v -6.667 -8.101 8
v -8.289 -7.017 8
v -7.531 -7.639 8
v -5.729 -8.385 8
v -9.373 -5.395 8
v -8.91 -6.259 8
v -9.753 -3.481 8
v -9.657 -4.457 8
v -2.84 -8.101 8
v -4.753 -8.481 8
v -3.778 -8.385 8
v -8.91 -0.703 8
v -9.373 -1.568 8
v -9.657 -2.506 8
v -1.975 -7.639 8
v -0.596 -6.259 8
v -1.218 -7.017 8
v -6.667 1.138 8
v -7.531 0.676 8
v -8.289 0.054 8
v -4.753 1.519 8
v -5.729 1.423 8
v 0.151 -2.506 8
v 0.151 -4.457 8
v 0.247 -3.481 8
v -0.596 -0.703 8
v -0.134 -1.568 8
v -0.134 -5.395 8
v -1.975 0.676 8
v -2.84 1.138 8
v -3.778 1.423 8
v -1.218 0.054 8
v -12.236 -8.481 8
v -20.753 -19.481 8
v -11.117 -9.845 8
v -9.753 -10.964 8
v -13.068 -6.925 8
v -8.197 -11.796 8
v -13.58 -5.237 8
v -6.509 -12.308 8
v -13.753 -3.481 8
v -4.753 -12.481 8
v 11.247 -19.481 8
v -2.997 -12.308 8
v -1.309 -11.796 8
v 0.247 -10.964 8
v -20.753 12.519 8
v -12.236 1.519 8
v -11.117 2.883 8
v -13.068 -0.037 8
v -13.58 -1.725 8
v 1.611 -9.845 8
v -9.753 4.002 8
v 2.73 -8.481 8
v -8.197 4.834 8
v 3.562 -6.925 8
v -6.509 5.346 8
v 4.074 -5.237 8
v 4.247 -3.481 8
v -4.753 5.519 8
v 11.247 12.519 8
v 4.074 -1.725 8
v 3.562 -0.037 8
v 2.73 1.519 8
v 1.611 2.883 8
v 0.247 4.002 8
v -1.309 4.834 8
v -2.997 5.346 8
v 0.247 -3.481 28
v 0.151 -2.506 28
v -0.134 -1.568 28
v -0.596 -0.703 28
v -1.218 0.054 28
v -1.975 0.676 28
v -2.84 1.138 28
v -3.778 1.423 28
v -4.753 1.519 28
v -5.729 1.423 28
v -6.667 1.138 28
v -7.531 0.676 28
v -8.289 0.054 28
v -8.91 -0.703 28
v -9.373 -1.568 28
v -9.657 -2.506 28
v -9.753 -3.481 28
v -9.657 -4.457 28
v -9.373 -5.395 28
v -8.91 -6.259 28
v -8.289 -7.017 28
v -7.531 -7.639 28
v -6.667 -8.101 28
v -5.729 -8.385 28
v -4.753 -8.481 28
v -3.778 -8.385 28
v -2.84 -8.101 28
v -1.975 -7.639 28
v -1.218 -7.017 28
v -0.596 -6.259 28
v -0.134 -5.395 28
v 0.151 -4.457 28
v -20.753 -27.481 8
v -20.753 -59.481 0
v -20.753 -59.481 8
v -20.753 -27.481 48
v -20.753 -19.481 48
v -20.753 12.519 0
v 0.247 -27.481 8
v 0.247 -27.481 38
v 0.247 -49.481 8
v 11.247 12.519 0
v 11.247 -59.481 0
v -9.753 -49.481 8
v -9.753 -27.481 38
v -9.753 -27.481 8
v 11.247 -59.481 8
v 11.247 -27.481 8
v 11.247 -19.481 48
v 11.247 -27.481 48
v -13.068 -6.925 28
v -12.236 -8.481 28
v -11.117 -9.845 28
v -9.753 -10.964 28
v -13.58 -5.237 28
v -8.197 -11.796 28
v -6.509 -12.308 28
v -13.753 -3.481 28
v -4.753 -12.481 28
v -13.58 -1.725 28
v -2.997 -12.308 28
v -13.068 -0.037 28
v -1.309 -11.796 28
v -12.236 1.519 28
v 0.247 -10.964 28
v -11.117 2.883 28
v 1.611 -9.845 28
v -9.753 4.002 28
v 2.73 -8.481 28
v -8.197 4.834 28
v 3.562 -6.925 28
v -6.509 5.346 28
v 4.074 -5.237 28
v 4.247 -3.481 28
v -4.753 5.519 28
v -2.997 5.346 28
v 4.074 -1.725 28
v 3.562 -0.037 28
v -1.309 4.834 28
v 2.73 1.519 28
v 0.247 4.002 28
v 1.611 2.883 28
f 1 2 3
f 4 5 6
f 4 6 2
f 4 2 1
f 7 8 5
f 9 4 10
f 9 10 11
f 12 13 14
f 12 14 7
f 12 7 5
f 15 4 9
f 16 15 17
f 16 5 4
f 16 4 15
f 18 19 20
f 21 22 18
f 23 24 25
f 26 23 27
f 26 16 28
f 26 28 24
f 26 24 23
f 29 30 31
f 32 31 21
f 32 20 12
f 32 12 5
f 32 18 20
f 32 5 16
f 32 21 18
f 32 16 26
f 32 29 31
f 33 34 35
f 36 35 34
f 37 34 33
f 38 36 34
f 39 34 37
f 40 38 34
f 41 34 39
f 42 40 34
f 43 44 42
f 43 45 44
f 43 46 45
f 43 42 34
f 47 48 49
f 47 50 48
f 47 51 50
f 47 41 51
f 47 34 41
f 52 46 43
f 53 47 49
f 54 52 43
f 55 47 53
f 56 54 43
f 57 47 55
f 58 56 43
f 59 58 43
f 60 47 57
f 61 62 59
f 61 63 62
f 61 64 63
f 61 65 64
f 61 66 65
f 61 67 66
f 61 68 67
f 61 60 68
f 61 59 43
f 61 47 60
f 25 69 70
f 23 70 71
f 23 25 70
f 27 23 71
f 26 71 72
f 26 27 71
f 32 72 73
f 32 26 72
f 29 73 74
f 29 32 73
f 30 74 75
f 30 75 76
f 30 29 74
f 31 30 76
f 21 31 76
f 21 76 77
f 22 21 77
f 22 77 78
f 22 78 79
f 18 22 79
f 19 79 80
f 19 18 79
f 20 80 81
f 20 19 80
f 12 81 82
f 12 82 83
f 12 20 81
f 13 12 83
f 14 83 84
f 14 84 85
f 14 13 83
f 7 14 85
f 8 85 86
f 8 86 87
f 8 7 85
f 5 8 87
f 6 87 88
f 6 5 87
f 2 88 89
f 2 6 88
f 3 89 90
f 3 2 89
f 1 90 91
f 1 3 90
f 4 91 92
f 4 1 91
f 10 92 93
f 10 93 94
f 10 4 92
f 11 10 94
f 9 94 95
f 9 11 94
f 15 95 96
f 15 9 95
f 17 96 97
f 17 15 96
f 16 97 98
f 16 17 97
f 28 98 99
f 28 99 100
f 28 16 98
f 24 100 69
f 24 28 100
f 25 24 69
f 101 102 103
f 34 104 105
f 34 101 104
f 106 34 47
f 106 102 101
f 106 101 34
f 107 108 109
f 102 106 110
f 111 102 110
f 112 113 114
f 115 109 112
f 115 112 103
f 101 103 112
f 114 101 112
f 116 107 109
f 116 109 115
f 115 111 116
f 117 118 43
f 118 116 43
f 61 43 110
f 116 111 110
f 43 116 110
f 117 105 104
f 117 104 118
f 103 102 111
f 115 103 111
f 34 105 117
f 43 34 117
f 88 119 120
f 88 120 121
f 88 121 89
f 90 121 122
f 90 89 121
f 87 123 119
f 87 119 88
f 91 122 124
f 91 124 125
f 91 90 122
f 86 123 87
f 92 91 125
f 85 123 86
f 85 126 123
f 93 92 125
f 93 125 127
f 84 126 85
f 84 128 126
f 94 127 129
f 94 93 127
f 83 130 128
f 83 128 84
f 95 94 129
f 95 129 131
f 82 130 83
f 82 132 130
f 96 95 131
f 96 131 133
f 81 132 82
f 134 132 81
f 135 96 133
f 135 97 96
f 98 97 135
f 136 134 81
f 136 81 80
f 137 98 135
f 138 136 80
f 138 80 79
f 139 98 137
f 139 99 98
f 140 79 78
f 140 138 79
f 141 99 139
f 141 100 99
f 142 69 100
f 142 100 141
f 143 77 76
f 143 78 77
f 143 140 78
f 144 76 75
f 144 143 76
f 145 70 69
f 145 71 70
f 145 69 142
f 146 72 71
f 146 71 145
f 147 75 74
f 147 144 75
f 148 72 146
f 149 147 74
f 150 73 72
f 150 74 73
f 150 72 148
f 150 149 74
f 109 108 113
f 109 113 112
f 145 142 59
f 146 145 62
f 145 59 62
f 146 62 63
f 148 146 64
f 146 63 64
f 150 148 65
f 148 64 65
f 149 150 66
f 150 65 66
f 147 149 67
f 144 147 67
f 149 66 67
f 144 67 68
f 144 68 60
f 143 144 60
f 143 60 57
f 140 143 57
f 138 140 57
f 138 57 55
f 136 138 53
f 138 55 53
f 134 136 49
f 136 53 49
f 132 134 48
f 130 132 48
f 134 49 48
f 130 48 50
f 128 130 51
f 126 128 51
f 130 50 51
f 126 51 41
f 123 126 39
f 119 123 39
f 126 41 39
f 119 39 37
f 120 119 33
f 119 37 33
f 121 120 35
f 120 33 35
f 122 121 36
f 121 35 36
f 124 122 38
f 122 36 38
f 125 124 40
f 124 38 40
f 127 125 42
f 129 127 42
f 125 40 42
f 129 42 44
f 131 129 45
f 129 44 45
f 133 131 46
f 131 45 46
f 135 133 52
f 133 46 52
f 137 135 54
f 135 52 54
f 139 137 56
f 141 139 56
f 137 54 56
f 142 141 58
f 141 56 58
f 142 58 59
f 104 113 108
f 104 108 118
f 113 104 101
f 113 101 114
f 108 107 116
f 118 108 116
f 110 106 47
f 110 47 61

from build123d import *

# Parameters (mm, degrees)
SKETCH2_W           = 32
SKETCH2_H           = 72
BOSS_EXTRUDE1_DEPTH = 8
SKETCH3_R           = 9
SKETCH3_R_2         = 5
SKETCH3_W           = 32
SKETCH3_H           = 8
BOSS_EXTRUDE2_DEPTH = 20
SKETCH4_W           = 32
SKETCH4_H           = 8
BOSS_EXTRUDE3_DEPTH = 20
RIB1_REACH          = 80.09
SKETCH5_WALL_W      = 195.381659614
SKETCH5_WALL_H      = 10


with BuildPart() as part:
    # Sketch2 → Boss-Extrude1 (new body)
    with BuildSketch(Plane.XY):
        with Locations((-4.753138075, -23.481171548)):
            Rectangle(SKETCH2_W, SKETCH2_H)
    extrude(amount=BOSS_EXTRUDE1_DEPTH)

    # Sketch3 → Boss-Extrude2 (add)
    # profile 1 of 2: a face of its own
    with BuildSketch(Plane.XY.offset(8)):
        with Locations((-4.753138075, -3.481171548)):
            Circle(SKETCH3_R)
        with Locations((-4.753138075, -3.481171548)):
            Circle(SKETCH3_R_2, mode=Mode.SUBTRACT)
    # profile 2 of 2: a face of its own
    with BuildSketch(Plane.XY.offset(8)):
        with Locations((-4.753138075, -23.481171548)):
            Rectangle(SKETCH3_W, SKETCH3_H)
    extrude(amount=BOSS_EXTRUDE2_DEPTH)

    # Sketch4 → Boss-Extrude3 (add)
    with BuildSketch(Plane.XY.offset(28)):
        with Locations((-4.753138075, -23.481171548)):
            Rectangle(SKETCH4_W, SKETCH4_H)
    extrude(amount=BOSS_EXTRUDE3_DEPTH)

    # Sketch5 wall → Rib1 (add, up to next)
    with BuildSketch(Plane(origin=(-4.753138075, -38.481171548, 23), x_dir=(0, -0.591363663628, -0.806404995856), z_dir=(0, -0.806404995856, 0.591363663628)), mode=Mode.PRIVATE) as rib1_sk1:
        Rectangle(SKETCH5_WALL_W, SKETCH5_WALL_H)
    rib1_tool1 = extrude(rib1_sk1.sketch, amount=-RIB1_REACH, mode=Mode.PRIVATE) - part.part
    add(rib1_tool1.solids().sort_by_distance((-4.753138075, -38.481171548, 23))[0])


solid = part.part
